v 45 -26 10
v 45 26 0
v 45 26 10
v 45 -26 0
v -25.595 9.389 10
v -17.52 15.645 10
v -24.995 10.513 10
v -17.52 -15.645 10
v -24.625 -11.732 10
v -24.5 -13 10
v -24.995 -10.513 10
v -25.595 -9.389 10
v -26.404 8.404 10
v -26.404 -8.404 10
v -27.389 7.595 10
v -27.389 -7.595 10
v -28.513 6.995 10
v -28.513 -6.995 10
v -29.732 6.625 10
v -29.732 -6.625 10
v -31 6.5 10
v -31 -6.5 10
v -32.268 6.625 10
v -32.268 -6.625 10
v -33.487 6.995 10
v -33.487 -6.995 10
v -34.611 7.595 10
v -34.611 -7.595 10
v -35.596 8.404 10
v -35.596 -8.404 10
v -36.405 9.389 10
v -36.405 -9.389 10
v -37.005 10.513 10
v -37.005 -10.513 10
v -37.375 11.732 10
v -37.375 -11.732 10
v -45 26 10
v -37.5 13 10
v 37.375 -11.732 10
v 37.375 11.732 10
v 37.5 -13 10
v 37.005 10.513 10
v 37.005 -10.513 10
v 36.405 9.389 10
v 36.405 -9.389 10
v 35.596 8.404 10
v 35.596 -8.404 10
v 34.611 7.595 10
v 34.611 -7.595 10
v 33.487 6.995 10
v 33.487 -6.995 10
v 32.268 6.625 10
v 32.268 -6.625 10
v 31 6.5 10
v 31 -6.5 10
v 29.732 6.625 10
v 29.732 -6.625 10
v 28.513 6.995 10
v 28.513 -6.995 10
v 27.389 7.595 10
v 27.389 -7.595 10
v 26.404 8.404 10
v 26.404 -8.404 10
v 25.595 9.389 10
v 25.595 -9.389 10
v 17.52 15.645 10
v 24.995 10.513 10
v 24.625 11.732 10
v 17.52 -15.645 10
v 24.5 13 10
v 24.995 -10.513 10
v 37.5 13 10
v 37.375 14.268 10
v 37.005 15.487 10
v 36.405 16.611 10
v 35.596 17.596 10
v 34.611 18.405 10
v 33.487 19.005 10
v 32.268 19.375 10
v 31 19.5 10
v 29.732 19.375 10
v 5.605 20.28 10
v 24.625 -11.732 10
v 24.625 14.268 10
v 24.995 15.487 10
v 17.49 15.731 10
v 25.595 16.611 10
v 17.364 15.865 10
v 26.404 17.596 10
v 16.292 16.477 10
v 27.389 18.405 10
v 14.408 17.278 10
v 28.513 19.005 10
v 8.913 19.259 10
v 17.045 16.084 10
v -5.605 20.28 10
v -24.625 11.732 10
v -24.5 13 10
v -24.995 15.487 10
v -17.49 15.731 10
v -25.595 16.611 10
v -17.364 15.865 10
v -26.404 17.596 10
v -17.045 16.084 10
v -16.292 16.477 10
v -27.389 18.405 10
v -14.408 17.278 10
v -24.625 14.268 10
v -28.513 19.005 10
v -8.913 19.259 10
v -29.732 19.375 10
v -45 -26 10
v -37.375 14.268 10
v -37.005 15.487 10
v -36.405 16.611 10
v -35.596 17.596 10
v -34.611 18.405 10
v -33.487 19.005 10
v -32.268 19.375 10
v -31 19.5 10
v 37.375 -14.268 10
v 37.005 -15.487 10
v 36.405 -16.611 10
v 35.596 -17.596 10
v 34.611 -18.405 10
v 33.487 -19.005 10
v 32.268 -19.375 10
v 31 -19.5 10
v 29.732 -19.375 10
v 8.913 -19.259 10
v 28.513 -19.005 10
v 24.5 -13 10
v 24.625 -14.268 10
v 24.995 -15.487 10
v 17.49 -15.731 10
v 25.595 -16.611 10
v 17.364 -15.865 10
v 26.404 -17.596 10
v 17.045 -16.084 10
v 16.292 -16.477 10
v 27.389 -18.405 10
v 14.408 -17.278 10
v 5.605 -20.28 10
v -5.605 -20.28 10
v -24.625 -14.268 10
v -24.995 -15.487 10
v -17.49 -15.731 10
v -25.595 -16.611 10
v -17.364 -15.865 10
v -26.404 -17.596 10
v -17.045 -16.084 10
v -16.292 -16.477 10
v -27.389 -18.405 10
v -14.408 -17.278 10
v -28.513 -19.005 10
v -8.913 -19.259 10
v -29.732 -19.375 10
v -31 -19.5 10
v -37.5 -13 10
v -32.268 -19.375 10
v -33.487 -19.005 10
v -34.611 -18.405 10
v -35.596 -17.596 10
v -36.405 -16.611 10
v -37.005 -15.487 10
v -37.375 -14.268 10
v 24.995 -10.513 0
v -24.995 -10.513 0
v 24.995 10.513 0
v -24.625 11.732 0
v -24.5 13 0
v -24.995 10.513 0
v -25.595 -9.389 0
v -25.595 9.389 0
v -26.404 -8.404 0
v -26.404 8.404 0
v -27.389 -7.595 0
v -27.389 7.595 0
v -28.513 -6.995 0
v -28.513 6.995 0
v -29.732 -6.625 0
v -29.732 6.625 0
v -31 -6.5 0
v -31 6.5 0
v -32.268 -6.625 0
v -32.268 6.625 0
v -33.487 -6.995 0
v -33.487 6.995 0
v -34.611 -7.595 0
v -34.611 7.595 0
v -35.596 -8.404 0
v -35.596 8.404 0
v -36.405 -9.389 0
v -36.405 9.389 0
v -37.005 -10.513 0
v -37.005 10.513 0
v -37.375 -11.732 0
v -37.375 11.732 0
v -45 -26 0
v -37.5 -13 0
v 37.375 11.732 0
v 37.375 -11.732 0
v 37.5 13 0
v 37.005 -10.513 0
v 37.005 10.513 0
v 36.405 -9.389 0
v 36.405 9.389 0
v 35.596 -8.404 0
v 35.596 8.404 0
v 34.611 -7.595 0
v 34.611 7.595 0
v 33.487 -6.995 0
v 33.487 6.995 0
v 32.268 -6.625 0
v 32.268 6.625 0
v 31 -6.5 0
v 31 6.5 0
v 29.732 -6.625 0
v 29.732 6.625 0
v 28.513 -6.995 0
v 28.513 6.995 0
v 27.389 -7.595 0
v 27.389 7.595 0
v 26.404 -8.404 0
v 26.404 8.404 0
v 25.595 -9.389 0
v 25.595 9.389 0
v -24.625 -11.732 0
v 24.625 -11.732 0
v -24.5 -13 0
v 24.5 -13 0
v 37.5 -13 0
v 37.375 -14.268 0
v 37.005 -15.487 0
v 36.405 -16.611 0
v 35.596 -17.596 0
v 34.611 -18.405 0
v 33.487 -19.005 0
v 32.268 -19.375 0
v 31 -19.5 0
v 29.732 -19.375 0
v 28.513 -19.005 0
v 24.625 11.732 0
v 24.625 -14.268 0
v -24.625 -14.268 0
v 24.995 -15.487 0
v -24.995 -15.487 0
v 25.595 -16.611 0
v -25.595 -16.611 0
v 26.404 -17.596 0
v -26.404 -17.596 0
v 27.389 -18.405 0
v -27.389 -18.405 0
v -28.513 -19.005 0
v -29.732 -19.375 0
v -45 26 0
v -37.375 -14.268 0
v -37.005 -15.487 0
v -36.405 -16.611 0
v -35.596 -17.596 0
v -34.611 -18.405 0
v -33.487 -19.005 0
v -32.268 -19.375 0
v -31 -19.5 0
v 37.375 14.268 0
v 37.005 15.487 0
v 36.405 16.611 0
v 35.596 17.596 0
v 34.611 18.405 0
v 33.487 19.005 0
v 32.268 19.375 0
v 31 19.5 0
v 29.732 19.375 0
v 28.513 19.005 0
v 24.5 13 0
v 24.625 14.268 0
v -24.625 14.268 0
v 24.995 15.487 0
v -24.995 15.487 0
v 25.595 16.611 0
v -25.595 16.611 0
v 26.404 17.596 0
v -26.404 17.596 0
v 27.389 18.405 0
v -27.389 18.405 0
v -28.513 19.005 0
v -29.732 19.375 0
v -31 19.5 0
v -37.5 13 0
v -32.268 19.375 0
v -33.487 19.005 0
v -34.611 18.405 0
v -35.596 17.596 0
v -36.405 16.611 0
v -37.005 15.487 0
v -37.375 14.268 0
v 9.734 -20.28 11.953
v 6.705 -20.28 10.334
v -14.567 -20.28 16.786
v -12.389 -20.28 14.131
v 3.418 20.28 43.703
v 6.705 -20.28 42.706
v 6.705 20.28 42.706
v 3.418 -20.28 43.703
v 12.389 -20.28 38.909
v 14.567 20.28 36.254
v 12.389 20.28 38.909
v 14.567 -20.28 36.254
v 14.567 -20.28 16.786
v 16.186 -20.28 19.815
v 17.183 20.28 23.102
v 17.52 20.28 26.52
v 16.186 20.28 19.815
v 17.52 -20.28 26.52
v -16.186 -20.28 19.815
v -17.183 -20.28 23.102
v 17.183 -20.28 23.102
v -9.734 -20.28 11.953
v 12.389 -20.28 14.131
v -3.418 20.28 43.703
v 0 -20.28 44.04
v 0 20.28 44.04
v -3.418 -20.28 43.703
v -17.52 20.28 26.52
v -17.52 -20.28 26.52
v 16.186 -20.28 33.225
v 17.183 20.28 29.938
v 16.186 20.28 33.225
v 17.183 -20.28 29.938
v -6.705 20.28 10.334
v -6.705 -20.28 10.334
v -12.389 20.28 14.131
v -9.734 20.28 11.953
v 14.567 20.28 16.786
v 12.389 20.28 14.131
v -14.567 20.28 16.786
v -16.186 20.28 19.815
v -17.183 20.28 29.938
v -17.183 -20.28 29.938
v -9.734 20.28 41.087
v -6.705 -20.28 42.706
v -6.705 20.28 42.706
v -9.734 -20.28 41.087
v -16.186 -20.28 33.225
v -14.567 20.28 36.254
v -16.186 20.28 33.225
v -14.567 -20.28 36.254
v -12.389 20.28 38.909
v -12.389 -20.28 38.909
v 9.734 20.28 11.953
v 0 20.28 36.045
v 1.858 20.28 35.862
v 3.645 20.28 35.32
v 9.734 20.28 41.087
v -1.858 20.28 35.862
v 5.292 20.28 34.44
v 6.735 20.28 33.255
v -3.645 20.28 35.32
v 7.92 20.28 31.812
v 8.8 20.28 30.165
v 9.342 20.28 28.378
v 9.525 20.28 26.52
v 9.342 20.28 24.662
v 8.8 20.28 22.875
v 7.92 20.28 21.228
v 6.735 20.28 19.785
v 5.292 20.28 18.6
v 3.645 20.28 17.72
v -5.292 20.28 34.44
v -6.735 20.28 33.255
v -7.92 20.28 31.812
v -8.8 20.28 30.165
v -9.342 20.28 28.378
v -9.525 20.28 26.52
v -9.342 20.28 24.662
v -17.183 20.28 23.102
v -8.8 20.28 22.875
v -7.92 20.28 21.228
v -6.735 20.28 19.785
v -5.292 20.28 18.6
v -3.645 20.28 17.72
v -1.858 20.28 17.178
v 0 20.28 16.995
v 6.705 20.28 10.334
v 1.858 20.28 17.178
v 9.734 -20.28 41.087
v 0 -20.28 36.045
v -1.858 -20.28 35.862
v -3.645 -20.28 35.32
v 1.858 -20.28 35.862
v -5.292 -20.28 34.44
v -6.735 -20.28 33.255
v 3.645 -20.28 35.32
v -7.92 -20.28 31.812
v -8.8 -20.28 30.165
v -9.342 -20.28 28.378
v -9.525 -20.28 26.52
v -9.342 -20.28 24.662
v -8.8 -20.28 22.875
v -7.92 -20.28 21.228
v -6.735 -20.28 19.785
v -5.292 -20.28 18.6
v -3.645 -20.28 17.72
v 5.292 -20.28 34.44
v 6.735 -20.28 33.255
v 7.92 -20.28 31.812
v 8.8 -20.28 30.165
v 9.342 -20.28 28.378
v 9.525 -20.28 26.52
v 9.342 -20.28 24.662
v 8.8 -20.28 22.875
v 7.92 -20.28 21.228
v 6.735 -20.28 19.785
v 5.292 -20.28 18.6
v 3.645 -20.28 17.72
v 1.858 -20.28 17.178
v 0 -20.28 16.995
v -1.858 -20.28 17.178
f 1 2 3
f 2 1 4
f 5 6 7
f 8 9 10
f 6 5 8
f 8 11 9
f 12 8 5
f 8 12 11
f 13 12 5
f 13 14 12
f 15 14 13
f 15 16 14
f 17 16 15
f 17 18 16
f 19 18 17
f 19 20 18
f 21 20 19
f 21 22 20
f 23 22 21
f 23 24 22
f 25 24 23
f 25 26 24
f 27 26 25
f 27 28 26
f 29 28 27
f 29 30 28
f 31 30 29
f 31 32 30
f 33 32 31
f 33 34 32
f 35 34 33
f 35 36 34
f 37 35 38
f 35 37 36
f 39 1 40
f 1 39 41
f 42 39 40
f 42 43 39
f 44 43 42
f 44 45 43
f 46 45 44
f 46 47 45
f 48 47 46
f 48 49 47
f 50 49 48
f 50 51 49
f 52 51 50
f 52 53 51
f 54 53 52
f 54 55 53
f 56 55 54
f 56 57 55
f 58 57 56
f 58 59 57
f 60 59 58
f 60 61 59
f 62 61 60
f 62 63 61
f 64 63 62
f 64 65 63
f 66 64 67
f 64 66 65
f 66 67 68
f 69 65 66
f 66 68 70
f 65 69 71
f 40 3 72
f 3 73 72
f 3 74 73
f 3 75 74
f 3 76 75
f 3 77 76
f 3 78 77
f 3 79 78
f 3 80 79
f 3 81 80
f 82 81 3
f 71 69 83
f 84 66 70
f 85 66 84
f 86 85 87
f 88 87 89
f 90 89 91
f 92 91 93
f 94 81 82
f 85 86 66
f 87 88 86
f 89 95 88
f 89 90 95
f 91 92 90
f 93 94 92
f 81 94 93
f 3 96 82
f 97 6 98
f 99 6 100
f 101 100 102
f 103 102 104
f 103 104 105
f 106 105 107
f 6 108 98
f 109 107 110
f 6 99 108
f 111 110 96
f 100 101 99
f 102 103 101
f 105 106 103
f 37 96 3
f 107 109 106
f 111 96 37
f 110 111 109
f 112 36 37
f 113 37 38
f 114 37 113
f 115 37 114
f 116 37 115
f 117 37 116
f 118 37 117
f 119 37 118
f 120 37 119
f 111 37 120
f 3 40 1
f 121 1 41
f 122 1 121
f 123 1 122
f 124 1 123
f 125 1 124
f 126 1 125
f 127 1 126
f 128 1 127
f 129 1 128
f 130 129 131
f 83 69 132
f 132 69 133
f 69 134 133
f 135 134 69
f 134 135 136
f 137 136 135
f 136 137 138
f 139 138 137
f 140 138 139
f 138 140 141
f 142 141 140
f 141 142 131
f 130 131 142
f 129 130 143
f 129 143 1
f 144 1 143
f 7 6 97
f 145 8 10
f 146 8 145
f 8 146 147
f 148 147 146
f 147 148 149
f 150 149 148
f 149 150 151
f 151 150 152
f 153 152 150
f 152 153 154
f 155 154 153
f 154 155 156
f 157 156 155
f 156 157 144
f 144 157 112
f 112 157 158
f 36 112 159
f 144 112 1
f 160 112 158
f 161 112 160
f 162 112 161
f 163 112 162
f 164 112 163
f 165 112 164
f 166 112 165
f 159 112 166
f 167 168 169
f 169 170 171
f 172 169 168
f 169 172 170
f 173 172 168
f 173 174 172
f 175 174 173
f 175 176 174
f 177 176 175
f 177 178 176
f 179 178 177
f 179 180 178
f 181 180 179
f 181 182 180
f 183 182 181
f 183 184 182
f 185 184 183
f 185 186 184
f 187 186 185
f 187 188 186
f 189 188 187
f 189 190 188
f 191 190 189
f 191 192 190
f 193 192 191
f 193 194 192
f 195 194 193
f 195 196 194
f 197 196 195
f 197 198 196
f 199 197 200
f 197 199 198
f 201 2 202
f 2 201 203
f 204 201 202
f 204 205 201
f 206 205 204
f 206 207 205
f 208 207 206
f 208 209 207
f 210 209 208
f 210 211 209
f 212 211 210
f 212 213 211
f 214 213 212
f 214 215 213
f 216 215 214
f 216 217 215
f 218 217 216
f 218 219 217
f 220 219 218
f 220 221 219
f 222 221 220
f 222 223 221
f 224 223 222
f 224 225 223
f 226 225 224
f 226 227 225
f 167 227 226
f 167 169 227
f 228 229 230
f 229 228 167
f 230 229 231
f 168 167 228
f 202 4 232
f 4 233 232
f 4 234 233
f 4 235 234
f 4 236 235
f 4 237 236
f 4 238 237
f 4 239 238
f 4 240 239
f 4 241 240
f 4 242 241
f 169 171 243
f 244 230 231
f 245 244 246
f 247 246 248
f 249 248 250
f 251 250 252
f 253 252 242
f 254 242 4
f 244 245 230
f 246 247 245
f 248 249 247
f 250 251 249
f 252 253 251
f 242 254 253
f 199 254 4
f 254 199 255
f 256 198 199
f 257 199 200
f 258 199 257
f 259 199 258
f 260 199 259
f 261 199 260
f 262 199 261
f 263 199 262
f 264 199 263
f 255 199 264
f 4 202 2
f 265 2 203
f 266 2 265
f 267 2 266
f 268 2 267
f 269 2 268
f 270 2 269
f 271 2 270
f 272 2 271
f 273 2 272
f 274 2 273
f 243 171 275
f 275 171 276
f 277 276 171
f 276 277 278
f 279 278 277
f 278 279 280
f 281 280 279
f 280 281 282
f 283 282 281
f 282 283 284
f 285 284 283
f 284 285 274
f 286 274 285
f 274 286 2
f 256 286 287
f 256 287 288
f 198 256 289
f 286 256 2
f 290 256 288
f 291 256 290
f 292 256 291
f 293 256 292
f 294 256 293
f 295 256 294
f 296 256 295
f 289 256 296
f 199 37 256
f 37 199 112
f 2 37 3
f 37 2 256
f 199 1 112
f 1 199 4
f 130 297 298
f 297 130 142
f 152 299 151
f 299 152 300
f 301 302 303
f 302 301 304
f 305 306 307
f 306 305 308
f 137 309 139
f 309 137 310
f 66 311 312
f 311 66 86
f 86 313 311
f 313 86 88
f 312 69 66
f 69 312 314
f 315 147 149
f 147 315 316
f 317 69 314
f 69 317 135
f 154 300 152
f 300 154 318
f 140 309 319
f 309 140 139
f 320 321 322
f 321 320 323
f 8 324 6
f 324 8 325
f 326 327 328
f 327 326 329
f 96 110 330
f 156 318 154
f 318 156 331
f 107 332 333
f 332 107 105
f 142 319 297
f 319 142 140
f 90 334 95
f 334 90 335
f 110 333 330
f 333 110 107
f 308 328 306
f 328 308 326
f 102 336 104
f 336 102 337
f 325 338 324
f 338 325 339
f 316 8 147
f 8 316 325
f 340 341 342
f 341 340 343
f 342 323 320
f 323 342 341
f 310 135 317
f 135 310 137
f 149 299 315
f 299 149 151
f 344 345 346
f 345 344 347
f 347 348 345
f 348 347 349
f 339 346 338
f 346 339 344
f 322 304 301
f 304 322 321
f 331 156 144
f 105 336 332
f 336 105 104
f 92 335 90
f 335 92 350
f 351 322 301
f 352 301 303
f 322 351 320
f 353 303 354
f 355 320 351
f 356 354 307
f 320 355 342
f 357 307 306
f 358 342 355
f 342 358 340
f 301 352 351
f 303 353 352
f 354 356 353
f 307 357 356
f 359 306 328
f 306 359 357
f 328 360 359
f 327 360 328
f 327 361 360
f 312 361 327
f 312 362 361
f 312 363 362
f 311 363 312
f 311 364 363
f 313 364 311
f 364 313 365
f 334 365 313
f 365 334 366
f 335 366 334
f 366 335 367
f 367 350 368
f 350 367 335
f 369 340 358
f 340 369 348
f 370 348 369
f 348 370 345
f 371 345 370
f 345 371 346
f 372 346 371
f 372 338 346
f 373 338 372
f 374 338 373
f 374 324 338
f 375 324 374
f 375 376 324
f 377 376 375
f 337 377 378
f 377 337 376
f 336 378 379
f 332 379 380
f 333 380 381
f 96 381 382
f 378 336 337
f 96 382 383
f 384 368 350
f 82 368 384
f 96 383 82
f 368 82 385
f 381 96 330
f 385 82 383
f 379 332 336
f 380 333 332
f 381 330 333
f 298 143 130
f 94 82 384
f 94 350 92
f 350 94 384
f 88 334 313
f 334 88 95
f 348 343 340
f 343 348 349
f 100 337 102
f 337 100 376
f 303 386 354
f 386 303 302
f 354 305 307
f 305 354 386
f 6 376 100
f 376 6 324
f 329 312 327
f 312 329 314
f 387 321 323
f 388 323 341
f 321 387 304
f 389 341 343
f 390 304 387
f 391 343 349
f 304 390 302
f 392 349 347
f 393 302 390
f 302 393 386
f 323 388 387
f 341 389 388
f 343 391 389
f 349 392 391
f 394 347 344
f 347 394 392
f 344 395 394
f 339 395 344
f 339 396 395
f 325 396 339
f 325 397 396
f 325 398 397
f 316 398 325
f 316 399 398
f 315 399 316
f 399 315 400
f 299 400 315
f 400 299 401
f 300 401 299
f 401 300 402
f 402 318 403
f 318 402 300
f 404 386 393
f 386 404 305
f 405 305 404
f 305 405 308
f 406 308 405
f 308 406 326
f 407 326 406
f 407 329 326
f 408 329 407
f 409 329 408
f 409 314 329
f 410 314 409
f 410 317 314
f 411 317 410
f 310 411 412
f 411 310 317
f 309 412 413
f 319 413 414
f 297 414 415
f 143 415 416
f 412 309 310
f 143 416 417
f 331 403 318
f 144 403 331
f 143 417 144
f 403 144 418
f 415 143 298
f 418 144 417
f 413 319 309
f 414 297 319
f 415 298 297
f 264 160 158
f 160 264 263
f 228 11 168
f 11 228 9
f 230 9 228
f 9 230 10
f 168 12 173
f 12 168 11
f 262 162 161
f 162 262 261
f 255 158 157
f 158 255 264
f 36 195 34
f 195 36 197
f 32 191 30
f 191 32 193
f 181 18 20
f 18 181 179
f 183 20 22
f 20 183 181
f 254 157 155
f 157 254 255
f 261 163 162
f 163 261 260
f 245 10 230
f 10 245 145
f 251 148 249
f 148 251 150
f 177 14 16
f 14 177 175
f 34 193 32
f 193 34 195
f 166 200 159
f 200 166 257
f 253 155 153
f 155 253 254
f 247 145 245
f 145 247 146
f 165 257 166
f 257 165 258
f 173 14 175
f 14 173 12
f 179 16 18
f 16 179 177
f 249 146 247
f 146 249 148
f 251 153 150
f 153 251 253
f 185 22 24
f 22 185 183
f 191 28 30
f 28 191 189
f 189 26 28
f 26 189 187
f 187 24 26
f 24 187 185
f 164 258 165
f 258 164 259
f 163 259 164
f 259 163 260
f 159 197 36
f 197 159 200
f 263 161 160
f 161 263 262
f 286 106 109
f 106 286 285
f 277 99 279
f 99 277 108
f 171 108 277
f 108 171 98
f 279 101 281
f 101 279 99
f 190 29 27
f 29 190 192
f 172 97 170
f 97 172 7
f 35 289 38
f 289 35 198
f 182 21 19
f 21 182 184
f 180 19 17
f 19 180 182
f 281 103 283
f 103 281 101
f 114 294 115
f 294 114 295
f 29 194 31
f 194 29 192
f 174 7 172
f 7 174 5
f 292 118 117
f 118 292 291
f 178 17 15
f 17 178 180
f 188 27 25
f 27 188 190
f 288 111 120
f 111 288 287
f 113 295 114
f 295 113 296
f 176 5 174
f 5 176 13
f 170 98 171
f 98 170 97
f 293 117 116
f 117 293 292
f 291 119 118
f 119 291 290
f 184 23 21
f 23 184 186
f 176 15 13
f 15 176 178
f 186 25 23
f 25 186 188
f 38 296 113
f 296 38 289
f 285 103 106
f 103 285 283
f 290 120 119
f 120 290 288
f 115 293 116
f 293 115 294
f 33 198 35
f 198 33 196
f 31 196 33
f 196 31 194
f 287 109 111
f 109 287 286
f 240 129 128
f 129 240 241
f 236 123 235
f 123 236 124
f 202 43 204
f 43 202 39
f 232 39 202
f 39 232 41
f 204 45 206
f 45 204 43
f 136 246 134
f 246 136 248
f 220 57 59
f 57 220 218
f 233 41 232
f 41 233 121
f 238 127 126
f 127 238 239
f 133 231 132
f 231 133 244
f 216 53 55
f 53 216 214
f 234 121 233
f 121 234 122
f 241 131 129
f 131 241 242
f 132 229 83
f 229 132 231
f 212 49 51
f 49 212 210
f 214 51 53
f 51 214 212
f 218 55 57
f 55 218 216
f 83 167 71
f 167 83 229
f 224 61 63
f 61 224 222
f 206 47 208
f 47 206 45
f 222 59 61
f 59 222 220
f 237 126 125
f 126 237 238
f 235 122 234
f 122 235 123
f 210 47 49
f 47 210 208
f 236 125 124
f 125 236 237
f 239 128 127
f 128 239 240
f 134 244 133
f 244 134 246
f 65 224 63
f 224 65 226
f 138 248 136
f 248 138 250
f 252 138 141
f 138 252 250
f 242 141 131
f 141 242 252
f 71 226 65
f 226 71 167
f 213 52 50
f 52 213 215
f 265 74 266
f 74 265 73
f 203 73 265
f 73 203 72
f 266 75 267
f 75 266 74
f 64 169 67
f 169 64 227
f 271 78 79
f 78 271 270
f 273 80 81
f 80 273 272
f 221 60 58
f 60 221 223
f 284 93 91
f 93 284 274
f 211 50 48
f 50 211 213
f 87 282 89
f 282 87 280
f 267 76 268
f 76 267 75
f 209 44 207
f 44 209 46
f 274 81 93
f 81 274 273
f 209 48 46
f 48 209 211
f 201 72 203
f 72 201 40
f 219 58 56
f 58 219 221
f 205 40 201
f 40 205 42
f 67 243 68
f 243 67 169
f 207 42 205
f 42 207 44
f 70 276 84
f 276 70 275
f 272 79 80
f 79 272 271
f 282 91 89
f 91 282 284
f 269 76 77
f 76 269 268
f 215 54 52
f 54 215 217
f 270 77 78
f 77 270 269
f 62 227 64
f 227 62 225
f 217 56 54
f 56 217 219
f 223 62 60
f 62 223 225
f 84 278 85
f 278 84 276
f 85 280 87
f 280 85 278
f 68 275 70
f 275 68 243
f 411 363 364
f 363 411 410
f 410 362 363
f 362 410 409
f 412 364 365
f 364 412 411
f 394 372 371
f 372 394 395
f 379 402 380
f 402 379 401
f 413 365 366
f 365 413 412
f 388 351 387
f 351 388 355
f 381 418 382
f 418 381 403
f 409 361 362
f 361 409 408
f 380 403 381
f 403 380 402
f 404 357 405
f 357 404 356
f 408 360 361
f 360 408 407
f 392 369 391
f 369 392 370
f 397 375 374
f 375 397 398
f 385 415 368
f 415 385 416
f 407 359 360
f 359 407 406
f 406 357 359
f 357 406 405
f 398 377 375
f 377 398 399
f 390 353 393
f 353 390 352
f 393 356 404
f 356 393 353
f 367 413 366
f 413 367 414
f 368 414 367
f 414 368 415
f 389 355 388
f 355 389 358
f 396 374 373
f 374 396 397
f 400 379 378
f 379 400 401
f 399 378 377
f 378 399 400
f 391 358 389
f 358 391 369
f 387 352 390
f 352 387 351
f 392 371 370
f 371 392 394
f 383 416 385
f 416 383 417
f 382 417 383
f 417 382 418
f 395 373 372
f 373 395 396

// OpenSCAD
$fn = 32;

// ----------------------------------------------------------------------
// Bearing block: 90 x 52 mm base, 19.05 mm bore at 26.52 mm
// ----------------------------------------------------------------------

// --- parameters (mm) ---
base_w = 90;              // base width
base_d = 52;              // base depth
base_t = 10;              // base thickness
bore_d = 19.05;           // shaft / bearing bore
house_r = 17.52;          // housing outer radius
house_len = 40.56;        // housing length along the shaft
foot_w = 35.04;           // foot width under the housing
foot_len = 30.56;         // foot length along the shaft
axis_z = 26.52;           // bore axis height above the base
holes_d = 13;             // mounting holes
hole_x = 31;              // mounting hole spacing

difference() {
  union() {
    /* base plate with its underside on z = 0 */
    translate([0, 0, base_t / 2]) cube([base_w, base_d, base_t], center = true);
    /* hull foot: a straight web blending into the round housing */
    hull() {
      translate([0, 0, base_t - 0.5]) cube([foot_w, foot_len, 1.6], center = true);
      translate([0, 0, axis_z]) rotate([-90, 0, 0]) cylinder(h = house_len, d = 2 * house_r, center = true);
    }
  }
  /* bore through the housing, 2.5 mm clear on both sides */
  translate([0, 0, axis_z]) rotate([-90, 0, 0]) cylinder(h = house_len + 5, d = bore_d, center = true);
  /* mounting holes through the base plate */
  for (hx = [-31, 31]) {
    for (hy = [-13, 13]) {
      translate([hx, hy, -2.5]) cylinder(h = base_t + 5, d = holes_d);
    }
  }
}
